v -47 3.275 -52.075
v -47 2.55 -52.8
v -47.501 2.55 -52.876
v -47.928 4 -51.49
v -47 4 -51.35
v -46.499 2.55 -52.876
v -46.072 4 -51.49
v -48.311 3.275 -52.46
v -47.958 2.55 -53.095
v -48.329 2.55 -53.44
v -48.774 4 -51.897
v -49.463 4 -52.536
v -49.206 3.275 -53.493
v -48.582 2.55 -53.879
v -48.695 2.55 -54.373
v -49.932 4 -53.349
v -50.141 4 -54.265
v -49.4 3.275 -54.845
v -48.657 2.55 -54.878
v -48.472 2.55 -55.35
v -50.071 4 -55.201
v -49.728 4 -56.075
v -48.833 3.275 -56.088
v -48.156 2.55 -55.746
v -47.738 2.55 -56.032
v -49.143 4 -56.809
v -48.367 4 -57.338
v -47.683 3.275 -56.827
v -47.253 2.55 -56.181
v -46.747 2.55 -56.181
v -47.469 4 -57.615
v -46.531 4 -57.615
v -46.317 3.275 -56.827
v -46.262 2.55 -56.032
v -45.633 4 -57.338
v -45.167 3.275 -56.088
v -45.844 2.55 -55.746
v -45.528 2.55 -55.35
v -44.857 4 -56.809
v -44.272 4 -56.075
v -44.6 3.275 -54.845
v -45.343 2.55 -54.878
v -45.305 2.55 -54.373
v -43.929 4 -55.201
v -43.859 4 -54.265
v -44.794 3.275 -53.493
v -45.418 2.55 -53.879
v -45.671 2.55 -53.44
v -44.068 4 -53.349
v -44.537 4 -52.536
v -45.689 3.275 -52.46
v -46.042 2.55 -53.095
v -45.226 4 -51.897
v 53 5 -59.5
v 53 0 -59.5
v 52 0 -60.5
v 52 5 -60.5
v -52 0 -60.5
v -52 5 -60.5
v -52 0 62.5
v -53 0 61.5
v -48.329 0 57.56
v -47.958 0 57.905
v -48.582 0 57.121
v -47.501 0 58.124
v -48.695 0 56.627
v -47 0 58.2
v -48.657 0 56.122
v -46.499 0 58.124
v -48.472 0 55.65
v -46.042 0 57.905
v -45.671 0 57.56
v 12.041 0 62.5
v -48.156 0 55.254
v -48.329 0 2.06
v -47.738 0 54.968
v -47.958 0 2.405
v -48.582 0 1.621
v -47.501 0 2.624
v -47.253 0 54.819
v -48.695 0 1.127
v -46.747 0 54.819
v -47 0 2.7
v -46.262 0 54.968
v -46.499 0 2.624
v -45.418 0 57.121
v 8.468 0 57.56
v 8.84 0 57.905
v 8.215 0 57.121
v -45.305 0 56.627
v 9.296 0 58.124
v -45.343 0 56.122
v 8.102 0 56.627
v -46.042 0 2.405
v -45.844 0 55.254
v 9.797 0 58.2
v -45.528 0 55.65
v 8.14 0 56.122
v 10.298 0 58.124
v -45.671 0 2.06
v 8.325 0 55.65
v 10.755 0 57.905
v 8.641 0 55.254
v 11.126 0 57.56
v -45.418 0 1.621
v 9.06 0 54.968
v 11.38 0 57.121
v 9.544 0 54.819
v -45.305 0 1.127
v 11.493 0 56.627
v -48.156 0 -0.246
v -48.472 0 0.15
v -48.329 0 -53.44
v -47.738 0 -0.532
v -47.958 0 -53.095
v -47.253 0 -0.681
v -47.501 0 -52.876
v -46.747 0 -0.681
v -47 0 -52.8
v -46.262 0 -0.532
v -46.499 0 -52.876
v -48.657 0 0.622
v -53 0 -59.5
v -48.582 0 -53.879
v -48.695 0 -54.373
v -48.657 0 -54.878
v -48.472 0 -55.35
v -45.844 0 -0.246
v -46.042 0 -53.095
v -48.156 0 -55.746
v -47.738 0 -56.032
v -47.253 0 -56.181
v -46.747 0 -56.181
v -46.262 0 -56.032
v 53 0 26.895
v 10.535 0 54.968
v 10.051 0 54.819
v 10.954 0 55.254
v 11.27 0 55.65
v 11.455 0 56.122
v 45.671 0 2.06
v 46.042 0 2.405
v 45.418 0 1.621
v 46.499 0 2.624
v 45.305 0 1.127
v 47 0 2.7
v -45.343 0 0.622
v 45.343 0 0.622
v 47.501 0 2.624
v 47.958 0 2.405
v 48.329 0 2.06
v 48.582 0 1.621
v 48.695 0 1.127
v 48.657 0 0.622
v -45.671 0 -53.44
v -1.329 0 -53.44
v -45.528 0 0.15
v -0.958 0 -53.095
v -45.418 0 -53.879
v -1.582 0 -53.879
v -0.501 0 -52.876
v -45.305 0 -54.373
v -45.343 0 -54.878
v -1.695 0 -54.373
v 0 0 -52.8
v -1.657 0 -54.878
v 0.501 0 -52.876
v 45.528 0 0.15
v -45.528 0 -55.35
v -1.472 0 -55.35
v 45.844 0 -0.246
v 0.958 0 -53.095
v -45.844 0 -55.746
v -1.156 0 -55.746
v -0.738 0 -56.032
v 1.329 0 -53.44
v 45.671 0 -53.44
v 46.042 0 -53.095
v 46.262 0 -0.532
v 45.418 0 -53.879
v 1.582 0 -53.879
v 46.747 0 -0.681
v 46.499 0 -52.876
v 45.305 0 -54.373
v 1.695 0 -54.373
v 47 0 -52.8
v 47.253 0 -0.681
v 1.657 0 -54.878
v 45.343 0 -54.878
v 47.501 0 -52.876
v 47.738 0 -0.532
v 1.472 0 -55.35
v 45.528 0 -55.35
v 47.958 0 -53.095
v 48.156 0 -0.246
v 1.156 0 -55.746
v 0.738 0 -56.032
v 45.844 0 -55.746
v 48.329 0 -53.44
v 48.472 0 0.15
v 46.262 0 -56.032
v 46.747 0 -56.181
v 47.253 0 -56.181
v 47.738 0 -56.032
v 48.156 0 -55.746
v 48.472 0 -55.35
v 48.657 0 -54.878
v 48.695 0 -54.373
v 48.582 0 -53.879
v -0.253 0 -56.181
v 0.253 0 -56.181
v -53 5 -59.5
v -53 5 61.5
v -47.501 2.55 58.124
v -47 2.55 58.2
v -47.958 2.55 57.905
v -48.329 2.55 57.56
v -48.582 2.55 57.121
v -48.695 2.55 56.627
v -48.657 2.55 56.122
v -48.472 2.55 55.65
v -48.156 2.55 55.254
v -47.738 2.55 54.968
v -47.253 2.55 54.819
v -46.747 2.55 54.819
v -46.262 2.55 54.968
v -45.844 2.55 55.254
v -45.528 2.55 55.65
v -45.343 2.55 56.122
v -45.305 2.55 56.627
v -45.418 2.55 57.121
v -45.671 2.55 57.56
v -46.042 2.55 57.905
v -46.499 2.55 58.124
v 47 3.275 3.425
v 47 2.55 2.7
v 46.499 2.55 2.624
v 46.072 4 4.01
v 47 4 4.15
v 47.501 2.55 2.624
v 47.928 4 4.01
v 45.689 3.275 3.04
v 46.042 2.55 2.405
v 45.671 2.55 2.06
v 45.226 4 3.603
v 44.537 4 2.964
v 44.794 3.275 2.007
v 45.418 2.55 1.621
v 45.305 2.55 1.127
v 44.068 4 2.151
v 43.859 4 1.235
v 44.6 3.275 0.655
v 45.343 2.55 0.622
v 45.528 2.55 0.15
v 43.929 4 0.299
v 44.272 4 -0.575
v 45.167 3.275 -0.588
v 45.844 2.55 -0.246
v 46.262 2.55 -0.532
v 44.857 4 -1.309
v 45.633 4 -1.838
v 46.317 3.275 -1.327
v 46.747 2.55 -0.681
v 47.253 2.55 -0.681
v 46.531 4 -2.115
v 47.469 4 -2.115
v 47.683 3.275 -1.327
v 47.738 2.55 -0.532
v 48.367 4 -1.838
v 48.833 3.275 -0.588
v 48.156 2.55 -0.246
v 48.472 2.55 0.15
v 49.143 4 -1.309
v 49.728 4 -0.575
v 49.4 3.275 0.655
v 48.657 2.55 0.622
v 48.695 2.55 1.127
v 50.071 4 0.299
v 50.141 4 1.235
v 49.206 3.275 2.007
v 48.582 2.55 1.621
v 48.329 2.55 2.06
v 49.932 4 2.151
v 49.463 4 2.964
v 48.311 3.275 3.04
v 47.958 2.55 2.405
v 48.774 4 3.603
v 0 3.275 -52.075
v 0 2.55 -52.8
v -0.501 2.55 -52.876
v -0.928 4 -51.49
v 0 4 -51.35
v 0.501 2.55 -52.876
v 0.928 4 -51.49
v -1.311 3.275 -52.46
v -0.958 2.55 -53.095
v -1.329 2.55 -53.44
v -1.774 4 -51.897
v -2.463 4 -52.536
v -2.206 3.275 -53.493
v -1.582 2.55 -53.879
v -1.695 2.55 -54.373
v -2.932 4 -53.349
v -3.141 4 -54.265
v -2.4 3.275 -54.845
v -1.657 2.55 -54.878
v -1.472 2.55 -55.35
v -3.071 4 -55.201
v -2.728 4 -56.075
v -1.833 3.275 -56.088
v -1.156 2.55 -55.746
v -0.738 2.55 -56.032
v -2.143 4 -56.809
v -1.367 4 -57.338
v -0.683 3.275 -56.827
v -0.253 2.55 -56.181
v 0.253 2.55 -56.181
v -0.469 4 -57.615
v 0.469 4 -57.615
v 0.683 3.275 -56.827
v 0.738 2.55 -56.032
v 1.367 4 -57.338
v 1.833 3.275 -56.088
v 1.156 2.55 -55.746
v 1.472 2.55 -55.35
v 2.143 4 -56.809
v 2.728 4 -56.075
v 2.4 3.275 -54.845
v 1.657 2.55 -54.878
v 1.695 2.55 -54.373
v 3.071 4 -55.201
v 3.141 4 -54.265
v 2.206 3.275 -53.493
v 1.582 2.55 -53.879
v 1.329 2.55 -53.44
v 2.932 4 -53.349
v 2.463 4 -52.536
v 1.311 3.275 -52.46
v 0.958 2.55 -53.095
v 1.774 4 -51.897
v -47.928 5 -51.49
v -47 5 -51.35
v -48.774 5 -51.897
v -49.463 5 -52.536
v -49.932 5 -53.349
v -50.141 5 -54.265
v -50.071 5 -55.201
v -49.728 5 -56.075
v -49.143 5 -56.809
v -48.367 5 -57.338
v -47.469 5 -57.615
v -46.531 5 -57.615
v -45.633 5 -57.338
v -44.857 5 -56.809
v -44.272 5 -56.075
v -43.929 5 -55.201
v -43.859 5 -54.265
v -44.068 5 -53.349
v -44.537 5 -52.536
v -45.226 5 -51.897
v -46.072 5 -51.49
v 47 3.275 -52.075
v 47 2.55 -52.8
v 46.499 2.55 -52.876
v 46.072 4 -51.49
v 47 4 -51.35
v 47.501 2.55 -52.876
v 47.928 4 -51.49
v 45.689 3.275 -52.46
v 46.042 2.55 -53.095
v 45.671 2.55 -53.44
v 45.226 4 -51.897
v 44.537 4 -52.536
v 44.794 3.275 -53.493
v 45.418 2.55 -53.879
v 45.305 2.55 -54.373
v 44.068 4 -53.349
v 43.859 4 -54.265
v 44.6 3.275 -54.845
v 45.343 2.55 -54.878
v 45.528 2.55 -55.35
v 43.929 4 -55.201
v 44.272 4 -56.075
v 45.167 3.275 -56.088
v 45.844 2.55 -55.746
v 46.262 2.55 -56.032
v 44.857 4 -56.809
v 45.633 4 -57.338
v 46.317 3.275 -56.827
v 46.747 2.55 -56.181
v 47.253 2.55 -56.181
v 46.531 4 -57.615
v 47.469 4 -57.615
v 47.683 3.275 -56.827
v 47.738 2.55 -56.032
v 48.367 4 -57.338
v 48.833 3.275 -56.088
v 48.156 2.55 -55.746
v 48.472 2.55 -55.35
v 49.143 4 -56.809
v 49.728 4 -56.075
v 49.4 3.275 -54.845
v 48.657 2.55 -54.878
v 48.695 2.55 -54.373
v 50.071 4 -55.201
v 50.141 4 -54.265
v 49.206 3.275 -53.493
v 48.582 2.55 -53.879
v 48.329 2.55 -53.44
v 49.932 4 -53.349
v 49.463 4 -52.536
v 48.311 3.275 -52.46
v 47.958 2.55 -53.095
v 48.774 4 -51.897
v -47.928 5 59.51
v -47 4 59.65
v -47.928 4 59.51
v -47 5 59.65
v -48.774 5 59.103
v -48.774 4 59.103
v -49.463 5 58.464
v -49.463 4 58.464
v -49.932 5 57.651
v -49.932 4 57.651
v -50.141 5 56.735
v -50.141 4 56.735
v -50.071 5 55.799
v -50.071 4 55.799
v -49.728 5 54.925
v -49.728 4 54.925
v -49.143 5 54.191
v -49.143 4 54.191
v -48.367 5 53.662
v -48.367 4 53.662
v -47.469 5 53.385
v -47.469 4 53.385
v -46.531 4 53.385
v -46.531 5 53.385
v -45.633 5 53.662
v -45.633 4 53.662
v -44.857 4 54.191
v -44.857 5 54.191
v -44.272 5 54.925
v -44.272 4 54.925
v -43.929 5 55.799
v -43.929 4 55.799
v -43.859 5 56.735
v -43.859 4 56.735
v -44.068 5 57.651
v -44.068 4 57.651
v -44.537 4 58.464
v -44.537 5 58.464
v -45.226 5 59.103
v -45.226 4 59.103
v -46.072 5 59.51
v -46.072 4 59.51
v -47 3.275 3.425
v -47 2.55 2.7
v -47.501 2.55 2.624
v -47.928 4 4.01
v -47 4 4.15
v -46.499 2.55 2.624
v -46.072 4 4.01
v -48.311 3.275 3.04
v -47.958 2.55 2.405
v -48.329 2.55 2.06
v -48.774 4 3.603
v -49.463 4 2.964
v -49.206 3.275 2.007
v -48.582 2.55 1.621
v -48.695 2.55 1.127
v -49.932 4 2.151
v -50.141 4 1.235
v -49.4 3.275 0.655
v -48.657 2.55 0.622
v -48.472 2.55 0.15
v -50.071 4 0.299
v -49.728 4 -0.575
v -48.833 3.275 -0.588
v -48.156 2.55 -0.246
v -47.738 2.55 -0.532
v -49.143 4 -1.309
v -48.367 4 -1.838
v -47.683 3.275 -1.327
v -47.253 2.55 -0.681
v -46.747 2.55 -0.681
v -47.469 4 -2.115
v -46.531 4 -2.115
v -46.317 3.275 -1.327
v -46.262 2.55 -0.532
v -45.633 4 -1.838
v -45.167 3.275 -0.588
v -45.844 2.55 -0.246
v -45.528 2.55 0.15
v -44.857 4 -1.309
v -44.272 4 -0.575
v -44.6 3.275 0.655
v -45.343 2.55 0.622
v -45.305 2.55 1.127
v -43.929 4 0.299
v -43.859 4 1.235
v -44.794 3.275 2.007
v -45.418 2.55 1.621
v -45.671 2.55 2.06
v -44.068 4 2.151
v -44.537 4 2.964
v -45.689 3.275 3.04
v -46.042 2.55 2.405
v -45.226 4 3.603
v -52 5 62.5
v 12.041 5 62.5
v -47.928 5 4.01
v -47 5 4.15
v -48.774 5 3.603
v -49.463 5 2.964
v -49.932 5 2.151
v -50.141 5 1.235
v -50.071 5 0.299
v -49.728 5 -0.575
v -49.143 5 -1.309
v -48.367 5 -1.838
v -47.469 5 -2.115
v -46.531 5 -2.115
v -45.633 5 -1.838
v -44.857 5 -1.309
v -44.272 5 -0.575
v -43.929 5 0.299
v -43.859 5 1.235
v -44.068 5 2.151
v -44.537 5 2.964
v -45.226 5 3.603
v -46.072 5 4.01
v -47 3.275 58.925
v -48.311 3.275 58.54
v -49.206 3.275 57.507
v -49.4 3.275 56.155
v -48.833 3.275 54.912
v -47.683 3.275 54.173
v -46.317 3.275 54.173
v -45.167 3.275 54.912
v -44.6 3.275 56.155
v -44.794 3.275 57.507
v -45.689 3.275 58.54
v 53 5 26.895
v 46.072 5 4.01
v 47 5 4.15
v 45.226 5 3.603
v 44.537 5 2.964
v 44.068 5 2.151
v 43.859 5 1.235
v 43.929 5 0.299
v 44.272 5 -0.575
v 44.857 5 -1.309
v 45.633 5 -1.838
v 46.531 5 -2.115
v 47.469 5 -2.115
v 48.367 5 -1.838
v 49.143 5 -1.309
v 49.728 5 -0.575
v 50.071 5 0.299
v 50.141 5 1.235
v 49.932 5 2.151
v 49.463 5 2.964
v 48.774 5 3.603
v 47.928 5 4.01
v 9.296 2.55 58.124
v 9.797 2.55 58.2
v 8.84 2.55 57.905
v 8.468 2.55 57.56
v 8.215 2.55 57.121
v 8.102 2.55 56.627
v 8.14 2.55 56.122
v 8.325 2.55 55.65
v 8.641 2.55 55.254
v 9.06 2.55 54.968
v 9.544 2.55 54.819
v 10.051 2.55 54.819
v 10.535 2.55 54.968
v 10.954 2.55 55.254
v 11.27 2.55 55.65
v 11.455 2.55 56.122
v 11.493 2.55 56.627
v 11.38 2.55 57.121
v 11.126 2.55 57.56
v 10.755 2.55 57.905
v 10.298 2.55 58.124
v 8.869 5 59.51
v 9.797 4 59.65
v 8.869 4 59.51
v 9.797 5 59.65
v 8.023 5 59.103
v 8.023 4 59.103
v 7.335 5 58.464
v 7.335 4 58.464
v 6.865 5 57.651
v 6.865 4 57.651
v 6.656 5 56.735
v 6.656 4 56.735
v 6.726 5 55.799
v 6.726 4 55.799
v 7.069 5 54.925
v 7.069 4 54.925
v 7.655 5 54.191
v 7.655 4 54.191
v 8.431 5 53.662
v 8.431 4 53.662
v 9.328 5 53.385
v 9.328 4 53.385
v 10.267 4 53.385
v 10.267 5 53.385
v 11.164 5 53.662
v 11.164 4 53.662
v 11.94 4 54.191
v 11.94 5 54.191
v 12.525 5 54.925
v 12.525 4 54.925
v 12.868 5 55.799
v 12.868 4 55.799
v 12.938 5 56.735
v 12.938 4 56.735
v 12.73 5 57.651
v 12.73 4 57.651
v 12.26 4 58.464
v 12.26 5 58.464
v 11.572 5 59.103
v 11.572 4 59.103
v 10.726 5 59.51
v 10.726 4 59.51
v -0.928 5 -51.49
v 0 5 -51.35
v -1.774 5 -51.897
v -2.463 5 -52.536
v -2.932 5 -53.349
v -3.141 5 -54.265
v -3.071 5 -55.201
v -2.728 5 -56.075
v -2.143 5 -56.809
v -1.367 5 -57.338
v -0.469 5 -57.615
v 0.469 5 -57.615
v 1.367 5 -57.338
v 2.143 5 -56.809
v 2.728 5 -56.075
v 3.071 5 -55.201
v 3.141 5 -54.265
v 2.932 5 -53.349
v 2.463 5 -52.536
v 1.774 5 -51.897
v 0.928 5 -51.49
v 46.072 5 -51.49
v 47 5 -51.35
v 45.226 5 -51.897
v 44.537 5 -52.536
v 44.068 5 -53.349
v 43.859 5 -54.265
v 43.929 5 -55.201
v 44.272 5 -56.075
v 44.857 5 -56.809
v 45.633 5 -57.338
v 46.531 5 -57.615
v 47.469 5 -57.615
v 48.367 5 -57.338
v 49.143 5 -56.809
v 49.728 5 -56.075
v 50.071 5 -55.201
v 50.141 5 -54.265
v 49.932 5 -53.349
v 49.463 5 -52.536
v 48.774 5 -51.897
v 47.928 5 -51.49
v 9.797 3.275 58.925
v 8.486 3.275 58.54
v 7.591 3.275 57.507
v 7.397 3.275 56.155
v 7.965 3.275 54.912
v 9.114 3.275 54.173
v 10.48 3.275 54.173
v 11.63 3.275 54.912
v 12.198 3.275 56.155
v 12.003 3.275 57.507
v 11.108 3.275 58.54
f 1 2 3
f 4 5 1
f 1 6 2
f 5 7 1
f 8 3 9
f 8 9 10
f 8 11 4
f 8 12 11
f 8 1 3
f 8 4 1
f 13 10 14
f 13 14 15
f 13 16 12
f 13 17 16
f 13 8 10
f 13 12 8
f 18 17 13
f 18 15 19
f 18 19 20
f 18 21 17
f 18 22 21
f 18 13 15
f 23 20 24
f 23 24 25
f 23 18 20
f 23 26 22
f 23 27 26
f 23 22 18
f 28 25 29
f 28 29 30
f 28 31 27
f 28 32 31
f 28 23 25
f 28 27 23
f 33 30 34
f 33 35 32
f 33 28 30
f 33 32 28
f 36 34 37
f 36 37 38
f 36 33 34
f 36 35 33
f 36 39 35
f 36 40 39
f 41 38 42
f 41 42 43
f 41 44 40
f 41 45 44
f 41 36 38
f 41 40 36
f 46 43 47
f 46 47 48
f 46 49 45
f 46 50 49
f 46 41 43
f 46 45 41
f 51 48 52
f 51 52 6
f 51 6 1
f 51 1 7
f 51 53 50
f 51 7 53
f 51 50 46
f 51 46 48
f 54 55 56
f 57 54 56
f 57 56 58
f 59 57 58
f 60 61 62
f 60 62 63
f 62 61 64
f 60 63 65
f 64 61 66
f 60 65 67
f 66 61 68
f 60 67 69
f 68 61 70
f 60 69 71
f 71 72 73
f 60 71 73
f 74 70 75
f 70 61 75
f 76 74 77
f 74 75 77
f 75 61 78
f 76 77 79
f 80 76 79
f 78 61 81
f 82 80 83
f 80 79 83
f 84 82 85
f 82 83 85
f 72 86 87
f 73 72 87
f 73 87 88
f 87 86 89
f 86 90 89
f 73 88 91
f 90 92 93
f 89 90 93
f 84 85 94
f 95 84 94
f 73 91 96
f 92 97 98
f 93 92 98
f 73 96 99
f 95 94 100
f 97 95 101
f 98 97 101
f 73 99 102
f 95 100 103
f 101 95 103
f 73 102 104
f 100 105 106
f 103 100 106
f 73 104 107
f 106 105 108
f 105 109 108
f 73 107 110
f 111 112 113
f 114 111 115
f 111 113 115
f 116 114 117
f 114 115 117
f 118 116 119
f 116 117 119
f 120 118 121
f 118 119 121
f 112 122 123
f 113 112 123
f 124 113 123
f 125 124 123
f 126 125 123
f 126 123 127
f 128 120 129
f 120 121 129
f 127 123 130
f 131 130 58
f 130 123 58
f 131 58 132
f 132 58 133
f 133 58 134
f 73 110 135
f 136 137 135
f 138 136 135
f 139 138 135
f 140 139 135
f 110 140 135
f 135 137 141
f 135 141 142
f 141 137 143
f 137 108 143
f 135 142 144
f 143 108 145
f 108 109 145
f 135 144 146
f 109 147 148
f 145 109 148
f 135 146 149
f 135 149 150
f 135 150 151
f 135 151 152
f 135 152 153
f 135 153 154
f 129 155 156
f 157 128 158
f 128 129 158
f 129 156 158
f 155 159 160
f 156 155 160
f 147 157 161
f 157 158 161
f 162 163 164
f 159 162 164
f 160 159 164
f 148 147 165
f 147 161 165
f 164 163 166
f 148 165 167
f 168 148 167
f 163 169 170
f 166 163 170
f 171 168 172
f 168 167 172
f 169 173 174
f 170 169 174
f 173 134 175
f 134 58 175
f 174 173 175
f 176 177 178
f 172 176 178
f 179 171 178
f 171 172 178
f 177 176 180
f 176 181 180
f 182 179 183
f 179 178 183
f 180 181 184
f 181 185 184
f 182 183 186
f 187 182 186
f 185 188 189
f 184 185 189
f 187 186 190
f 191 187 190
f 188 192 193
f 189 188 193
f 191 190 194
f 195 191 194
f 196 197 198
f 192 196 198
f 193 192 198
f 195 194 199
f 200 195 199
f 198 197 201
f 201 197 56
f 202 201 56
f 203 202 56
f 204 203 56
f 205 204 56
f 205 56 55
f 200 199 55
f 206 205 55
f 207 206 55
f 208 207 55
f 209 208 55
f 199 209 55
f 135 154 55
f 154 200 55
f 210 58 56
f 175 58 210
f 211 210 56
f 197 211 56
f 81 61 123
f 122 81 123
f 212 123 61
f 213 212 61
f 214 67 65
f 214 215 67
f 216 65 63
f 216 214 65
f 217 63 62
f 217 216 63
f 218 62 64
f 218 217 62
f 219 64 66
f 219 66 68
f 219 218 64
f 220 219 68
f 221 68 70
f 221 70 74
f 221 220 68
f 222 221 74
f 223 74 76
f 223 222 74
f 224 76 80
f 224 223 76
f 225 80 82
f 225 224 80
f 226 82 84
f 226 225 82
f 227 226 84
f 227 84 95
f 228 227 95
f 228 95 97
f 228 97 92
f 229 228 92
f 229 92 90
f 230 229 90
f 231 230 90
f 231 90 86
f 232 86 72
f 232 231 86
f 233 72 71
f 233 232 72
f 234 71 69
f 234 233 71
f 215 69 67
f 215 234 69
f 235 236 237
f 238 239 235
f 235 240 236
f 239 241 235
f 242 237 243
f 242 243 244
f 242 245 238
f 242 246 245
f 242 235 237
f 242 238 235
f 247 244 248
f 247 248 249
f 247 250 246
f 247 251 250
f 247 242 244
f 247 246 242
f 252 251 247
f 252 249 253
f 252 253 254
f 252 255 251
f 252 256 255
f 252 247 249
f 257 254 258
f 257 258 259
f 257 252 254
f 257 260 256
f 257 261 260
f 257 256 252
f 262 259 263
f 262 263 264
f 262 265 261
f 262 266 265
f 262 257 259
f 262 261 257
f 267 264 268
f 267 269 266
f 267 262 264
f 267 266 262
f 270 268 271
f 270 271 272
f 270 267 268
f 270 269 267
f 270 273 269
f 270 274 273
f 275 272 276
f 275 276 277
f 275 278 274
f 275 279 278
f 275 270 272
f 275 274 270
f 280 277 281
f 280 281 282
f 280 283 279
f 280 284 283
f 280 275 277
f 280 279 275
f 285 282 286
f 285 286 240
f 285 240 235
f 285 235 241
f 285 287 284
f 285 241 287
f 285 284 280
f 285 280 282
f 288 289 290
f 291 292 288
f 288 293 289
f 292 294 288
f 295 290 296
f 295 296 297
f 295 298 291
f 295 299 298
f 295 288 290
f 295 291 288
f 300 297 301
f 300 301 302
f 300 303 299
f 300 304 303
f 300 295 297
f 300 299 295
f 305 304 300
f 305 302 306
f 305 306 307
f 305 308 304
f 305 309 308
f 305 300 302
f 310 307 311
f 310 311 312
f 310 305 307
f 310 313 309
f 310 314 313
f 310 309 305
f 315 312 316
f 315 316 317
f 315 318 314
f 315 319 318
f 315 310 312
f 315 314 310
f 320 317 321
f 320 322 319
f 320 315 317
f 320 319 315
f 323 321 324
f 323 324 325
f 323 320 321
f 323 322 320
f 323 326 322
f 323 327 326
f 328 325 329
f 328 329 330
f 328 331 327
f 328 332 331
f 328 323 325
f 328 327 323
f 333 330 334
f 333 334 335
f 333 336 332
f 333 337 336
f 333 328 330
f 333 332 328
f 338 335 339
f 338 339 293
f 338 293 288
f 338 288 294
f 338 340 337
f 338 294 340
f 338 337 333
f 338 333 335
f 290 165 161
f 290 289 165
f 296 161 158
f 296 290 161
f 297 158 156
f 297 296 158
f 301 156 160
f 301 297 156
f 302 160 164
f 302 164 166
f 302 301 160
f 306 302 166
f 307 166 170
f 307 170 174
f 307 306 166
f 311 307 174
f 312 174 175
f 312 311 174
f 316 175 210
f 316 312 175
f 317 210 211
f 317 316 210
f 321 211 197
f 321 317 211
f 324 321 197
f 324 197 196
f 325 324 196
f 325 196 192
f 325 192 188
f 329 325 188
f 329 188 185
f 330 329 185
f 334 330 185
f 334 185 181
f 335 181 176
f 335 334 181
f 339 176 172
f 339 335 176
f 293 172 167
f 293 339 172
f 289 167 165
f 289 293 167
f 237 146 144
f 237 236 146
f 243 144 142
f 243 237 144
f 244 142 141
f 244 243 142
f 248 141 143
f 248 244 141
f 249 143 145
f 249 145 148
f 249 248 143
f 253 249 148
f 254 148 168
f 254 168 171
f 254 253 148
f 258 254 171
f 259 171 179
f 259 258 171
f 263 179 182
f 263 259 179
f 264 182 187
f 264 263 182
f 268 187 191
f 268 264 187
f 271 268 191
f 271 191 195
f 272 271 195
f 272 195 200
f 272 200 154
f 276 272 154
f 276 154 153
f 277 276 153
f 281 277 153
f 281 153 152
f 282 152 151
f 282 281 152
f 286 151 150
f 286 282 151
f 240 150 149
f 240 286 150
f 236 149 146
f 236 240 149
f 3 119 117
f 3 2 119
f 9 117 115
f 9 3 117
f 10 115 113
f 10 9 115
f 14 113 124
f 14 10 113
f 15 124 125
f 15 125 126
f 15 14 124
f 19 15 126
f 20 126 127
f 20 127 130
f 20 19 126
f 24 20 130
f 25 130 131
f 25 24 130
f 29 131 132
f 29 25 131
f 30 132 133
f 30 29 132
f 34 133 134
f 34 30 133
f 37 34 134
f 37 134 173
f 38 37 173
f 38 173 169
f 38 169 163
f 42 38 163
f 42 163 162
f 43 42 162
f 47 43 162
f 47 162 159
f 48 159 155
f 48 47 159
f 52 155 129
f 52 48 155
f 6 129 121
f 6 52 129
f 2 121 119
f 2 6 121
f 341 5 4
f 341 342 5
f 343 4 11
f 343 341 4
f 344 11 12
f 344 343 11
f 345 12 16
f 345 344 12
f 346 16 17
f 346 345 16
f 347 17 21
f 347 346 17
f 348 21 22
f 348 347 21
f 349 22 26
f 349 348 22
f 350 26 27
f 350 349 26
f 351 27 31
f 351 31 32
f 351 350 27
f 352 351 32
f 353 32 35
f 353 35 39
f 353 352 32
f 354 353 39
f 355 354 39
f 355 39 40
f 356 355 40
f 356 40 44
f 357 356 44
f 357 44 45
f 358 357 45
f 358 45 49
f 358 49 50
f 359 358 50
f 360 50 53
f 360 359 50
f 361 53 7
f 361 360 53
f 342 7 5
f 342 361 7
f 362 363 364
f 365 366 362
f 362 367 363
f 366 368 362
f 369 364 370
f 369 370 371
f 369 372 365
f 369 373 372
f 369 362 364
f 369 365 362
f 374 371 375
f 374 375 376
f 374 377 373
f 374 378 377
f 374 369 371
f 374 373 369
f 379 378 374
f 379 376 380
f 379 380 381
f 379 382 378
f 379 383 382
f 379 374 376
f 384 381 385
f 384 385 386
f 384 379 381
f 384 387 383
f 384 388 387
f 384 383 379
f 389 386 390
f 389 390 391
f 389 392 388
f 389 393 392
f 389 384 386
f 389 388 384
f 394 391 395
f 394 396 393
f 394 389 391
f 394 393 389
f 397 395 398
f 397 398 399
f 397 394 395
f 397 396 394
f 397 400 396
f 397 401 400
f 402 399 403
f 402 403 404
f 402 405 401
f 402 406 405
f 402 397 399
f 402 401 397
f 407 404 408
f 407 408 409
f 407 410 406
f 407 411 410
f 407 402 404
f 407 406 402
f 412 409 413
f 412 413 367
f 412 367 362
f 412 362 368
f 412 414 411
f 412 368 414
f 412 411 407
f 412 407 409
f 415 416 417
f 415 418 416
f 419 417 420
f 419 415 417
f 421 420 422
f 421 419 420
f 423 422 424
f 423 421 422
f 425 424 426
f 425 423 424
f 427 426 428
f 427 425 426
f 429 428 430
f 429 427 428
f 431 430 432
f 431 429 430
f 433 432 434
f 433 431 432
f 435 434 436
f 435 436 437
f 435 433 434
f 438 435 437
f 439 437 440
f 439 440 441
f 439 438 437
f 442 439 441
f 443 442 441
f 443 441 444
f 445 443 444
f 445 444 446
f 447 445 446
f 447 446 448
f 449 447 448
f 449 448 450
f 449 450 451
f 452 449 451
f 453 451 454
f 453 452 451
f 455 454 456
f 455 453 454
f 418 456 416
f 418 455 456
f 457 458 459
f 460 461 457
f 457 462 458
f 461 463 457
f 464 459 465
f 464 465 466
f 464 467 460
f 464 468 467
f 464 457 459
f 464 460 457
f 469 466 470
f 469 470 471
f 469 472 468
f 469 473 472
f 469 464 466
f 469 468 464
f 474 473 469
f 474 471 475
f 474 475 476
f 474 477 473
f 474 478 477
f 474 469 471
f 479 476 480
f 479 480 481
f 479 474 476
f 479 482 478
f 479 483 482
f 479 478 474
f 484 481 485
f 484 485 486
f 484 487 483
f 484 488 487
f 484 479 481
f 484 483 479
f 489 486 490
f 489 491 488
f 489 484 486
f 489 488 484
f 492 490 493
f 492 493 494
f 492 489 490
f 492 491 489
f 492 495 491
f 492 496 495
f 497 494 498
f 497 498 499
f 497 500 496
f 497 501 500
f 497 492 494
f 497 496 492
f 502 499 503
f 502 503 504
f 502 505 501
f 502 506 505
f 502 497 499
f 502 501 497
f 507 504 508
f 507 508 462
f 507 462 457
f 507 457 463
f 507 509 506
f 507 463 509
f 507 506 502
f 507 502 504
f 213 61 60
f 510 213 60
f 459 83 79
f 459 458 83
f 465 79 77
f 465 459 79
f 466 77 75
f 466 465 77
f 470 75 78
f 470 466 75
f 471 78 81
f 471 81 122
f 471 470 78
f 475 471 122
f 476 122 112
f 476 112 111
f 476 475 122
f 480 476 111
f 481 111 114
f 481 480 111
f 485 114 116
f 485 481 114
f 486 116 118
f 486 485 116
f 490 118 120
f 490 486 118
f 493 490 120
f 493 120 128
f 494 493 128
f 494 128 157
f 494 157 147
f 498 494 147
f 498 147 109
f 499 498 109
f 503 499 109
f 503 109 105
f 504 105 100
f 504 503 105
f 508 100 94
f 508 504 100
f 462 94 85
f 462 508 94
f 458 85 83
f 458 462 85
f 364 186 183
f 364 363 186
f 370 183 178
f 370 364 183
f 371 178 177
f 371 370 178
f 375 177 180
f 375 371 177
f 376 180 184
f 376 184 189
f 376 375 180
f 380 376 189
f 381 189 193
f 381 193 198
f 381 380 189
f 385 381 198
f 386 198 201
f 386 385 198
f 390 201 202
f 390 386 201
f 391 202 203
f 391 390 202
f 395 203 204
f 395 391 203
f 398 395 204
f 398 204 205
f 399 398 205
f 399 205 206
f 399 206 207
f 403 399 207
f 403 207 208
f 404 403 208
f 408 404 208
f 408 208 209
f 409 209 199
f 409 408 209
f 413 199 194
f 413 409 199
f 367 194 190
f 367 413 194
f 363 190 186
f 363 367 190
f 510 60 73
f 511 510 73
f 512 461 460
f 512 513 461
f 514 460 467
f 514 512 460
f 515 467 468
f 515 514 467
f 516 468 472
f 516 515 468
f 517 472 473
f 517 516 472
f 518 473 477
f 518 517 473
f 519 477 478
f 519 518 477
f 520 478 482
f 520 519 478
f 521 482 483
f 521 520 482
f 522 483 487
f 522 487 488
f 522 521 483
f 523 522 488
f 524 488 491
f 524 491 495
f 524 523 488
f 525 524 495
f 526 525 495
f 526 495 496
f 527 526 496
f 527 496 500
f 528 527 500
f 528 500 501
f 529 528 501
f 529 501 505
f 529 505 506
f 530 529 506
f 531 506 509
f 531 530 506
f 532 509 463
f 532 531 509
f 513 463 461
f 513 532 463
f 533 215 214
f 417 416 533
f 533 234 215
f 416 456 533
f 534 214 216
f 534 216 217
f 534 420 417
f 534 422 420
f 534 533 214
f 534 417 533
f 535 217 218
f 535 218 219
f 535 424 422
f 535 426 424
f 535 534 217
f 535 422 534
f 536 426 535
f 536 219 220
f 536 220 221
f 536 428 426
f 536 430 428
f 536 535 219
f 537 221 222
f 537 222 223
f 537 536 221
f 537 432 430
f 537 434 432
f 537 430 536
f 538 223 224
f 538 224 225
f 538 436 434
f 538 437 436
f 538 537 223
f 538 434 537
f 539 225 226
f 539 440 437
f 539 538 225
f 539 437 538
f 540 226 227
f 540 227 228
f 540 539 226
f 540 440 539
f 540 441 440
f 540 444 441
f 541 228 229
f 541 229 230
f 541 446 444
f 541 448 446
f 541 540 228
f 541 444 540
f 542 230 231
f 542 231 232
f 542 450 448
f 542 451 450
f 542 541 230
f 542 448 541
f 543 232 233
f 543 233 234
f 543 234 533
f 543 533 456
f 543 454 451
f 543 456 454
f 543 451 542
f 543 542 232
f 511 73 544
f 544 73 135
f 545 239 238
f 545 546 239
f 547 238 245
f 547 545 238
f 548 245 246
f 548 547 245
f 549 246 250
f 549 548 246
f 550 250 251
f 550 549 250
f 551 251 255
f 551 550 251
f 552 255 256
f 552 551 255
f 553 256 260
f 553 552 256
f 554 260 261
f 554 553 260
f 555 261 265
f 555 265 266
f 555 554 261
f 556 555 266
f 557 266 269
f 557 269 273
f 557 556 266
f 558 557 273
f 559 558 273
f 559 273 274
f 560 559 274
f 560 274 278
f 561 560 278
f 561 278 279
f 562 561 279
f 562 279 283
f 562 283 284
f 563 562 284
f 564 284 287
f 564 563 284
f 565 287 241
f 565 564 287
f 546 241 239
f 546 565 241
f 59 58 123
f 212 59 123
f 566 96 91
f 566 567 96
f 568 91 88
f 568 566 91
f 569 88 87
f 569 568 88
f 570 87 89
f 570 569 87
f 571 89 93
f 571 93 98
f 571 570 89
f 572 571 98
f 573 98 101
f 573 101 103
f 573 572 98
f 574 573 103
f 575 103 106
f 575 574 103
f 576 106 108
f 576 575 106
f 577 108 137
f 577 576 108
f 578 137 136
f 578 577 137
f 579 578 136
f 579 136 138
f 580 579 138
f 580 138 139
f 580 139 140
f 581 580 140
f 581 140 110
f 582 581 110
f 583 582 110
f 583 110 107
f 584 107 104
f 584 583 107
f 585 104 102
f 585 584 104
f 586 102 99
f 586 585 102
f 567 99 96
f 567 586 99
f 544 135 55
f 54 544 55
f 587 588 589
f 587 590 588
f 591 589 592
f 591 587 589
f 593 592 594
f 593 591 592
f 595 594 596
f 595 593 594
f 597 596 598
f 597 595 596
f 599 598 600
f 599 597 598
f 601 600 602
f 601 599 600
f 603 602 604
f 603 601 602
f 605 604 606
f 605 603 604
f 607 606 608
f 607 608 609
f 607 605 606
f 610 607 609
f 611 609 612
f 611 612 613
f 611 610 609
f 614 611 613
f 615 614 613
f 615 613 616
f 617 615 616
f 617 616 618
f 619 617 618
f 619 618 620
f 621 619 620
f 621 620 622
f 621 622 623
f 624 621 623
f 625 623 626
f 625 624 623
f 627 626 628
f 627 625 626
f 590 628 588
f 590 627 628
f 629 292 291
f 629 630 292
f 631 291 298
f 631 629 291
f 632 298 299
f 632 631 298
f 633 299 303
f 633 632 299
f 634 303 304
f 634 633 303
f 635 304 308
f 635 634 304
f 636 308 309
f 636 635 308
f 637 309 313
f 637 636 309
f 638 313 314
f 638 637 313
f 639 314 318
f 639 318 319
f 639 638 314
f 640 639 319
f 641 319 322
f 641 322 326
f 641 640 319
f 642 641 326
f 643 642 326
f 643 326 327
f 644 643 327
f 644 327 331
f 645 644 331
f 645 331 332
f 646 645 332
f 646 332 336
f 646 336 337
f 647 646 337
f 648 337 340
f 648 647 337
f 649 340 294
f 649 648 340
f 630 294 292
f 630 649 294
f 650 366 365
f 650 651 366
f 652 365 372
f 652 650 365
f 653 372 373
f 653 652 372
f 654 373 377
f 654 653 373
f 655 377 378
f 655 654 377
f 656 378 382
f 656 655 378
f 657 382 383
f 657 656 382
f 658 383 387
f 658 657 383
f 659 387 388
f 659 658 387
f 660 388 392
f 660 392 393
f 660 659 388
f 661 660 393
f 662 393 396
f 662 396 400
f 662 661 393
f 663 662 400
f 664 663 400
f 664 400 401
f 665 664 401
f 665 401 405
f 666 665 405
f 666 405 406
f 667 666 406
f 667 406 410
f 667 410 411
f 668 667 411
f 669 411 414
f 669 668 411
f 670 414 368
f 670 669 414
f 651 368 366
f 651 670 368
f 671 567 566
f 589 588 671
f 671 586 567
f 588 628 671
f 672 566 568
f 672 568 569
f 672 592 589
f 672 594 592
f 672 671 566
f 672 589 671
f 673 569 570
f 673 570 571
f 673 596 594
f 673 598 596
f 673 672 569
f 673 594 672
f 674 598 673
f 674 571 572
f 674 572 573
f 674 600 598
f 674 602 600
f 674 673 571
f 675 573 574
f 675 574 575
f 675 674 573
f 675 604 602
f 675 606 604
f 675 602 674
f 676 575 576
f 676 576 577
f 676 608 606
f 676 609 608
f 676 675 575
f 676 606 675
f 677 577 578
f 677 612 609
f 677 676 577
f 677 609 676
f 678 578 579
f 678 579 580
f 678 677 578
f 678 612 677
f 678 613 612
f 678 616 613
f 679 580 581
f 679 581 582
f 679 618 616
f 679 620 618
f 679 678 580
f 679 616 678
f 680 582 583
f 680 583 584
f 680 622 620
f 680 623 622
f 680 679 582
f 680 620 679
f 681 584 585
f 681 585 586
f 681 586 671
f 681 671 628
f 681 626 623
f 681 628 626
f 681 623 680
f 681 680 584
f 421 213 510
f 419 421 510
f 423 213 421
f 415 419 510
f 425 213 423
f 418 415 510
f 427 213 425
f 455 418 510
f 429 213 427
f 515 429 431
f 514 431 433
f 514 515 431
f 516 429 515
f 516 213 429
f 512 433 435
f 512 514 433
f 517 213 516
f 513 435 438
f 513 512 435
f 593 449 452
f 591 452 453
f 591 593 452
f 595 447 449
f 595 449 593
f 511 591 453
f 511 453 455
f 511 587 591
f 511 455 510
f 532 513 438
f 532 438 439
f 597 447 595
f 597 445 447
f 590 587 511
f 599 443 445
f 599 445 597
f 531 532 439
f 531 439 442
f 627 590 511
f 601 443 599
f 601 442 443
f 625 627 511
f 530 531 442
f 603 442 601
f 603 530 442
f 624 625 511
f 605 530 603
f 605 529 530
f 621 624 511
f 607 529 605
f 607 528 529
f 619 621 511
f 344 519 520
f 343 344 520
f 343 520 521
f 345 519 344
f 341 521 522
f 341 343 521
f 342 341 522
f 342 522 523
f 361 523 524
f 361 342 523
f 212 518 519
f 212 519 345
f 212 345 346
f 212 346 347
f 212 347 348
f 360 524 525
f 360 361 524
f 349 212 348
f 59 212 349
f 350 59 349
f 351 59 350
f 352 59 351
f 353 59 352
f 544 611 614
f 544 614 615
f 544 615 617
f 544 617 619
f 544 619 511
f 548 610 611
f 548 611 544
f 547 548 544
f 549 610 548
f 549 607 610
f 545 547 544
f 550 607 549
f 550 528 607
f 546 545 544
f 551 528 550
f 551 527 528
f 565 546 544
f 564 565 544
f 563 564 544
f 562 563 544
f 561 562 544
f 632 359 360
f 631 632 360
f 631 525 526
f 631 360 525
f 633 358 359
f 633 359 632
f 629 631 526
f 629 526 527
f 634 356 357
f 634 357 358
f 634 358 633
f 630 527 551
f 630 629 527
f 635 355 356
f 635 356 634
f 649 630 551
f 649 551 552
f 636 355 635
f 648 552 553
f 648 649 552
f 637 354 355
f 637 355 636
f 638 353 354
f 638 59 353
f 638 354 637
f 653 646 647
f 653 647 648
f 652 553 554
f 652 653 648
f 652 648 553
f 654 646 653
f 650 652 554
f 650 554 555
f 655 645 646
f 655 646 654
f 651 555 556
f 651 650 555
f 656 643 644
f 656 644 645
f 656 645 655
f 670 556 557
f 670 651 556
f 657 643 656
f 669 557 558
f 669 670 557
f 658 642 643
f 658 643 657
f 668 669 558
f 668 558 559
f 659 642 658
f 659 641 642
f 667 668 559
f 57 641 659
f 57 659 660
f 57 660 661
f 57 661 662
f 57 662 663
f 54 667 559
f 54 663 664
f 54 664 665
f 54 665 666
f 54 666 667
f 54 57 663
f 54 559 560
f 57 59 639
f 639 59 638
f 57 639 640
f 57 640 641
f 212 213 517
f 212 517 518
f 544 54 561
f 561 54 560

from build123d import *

# Parameters (mm, degrees)
BOSS_EXTRUDE1_DEPTH                          = 5
CSK_FOR_M3_COUNTERSUNK_FLAT_HEAD_SCR_2_COUNT = 2
CSK_FOR_M3_COUNTERSUNK_FLAT_HEAD_SCR_2_PITCH = 47
CSK_FOR_M3_COUNTERSUNK_FLAT_HEAD_SCR_3_COUNT = 2
CSK_FOR_M3_COUNTERSUNK_FLAT_HEAD_SCR_3_PITCH = 94
CSK_FOR_M3_COUNTERSUNK_FLAT_HEAD_SCR_4_COUNT = 2
CSK_FOR_M3_COUNTERSUNK_FLAT_HEAD_SCR_4_PITCH = 109.16157749
CSK_FOR_M3_COUNTERSUNK_FLAT_HEAD_SCR_5_COUNT = 2
CSK_FOR_M3_COUNTERSUNK_FLAT_HEAD_SCR_5_PITCH = 124.687328624
CSK_FOR_M3_COUNTERSUNK_FLAT_HEAD_SCR_6_COUNT = 2
CSK_FOR_M3_COUNTERSUNK_FLAT_HEAD_SCR_6_PITCH = 111
CSK_FOR_M3_COUNTERSUNK_FLAT_HEAD_SCR_7_COUNT = 2
CSK_FOR_M3_COUNTERSUNK_FLAT_HEAD_SCR_7_PITCH = 55.5


with BuildPart() as part:
    # block_perimeter → Boss-Extrude1 (new body)
    with BuildSketch(Plane(origin=(0, 0, 0), x_dir=(1, 0, 0), z_dir=(0, 1, 0))):
        Polygon((52, 60.5), (-52, 60.5), (-53, 59.5), (-53, -61.5), (-52, -62.5), (12.040578429, -62.5), (53, -26.89451804), (53, 59.5), align=None)
    extrude(amount=BOSS_EXTRUDE1_DEPTH)

    # Sketch5 → CSK for M3 Countersunk Flat Head Screw1 (revolve, cut)
    with BuildSketch(Plane(origin=(-47, 5, -54.5), x_dir=(0, 0, 1), z_dir=(1, 0, 0))):
        Polygon((0, 0), (0, 5), (1.7, 5), (1.7, 2.45), (3.15, 1), (3.15, 0), align=None)
    csk_for_m3_countersunk_flat_head_screw1 = revolve(axis=Axis((-47, 11.35, -54.5), (0, -1, 0)), mode=Mode.SUBTRACT)

    # CSK for M3 Countersunk Flat Head Scr 2: CSK for M3 Countersunk Flat Head Screw1 ×2
    with Locations(*[(i * CSK_FOR_M3_COUNTERSUNK_FLAT_HEAD_SCR_2_PITCH, 0, 0) for i in range(1, CSK_FOR_M3_COUNTERSUNK_FLAT_HEAD_SCR_2_COUNT)]):
        add(csk_for_m3_countersunk_flat_head_screw1, mode=Mode.SUBTRACT)

    # CSK for M3 Countersunk Flat Head Scr 3: CSK for M3 Countersunk Flat Head Screw1 ×2
    with Locations(*[(i * CSK_FOR_M3_COUNTERSUNK_FLAT_HEAD_SCR_3_PITCH, 0, 0) for i in range(1, CSK_FOR_M3_COUNTERSUNK_FLAT_HEAD_SCR_3_COUNT)]):
        add(csk_for_m3_countersunk_flat_head_screw1, mode=Mode.SUBTRACT)

    # CSK for M3 Countersunk Flat Head Scr 4: CSK for M3 Countersunk Flat Head Screw1 ×2
    with Locations(*[Vector(0.8611088458210153, 0, 0.508420648330493) * (i * CSK_FOR_M3_COUNTERSUNK_FLAT_HEAD_SCR_4_PITCH) for i in range(1, CSK_FOR_M3_COUNTERSUNK_FLAT_HEAD_SCR_4_COUNT)]):
        add(csk_for_m3_countersunk_flat_head_screw1, mode=Mode.SUBTRACT)

    # CSK for M3 Countersunk Flat Head Scr 5: CSK for M3 Countersunk Flat Head Screw1 ×2
    with Locations(*[Vector(0.4555175812861699, 0, 0.8902267874756397) * (i * CSK_FOR_M3_COUNTERSUNK_FLAT_HEAD_SCR_5_PITCH) for i in range(1, CSK_FOR_M3_COUNTERSUNK_FLAT_HEAD_SCR_5_COUNT)]):
        add(csk_for_m3_countersunk_flat_head_screw1, mode=Mode.SUBTRACT)

    # CSK for M3 Countersunk Flat Head Scr 6: CSK for M3 Countersunk Flat Head Screw1 ×2
    with Locations(*[(0, 0, i * CSK_FOR_M3_COUNTERSUNK_FLAT_HEAD_SCR_6_PITCH) for i in range(1, CSK_FOR_M3_COUNTERSUNK_FLAT_HEAD_SCR_6_COUNT)]):
        add(csk_for_m3_countersunk_flat_head_screw1, mode=Mode.SUBTRACT)

    # CSK for M3 Countersunk Flat Head Scr 7: CSK for M3 Countersunk Flat Head Screw1 ×2
    with Locations(*[(0, 0, i * CSK_FOR_M3_COUNTERSUNK_FLAT_HEAD_SCR_7_PITCH) for i in range(1, CSK_FOR_M3_COUNTERSUNK_FLAT_HEAD_SCR_7_COUNT)]):
        add(csk_for_m3_countersunk_flat_head_screw1, mode=Mode.SUBTRACT)


solid = part.part
